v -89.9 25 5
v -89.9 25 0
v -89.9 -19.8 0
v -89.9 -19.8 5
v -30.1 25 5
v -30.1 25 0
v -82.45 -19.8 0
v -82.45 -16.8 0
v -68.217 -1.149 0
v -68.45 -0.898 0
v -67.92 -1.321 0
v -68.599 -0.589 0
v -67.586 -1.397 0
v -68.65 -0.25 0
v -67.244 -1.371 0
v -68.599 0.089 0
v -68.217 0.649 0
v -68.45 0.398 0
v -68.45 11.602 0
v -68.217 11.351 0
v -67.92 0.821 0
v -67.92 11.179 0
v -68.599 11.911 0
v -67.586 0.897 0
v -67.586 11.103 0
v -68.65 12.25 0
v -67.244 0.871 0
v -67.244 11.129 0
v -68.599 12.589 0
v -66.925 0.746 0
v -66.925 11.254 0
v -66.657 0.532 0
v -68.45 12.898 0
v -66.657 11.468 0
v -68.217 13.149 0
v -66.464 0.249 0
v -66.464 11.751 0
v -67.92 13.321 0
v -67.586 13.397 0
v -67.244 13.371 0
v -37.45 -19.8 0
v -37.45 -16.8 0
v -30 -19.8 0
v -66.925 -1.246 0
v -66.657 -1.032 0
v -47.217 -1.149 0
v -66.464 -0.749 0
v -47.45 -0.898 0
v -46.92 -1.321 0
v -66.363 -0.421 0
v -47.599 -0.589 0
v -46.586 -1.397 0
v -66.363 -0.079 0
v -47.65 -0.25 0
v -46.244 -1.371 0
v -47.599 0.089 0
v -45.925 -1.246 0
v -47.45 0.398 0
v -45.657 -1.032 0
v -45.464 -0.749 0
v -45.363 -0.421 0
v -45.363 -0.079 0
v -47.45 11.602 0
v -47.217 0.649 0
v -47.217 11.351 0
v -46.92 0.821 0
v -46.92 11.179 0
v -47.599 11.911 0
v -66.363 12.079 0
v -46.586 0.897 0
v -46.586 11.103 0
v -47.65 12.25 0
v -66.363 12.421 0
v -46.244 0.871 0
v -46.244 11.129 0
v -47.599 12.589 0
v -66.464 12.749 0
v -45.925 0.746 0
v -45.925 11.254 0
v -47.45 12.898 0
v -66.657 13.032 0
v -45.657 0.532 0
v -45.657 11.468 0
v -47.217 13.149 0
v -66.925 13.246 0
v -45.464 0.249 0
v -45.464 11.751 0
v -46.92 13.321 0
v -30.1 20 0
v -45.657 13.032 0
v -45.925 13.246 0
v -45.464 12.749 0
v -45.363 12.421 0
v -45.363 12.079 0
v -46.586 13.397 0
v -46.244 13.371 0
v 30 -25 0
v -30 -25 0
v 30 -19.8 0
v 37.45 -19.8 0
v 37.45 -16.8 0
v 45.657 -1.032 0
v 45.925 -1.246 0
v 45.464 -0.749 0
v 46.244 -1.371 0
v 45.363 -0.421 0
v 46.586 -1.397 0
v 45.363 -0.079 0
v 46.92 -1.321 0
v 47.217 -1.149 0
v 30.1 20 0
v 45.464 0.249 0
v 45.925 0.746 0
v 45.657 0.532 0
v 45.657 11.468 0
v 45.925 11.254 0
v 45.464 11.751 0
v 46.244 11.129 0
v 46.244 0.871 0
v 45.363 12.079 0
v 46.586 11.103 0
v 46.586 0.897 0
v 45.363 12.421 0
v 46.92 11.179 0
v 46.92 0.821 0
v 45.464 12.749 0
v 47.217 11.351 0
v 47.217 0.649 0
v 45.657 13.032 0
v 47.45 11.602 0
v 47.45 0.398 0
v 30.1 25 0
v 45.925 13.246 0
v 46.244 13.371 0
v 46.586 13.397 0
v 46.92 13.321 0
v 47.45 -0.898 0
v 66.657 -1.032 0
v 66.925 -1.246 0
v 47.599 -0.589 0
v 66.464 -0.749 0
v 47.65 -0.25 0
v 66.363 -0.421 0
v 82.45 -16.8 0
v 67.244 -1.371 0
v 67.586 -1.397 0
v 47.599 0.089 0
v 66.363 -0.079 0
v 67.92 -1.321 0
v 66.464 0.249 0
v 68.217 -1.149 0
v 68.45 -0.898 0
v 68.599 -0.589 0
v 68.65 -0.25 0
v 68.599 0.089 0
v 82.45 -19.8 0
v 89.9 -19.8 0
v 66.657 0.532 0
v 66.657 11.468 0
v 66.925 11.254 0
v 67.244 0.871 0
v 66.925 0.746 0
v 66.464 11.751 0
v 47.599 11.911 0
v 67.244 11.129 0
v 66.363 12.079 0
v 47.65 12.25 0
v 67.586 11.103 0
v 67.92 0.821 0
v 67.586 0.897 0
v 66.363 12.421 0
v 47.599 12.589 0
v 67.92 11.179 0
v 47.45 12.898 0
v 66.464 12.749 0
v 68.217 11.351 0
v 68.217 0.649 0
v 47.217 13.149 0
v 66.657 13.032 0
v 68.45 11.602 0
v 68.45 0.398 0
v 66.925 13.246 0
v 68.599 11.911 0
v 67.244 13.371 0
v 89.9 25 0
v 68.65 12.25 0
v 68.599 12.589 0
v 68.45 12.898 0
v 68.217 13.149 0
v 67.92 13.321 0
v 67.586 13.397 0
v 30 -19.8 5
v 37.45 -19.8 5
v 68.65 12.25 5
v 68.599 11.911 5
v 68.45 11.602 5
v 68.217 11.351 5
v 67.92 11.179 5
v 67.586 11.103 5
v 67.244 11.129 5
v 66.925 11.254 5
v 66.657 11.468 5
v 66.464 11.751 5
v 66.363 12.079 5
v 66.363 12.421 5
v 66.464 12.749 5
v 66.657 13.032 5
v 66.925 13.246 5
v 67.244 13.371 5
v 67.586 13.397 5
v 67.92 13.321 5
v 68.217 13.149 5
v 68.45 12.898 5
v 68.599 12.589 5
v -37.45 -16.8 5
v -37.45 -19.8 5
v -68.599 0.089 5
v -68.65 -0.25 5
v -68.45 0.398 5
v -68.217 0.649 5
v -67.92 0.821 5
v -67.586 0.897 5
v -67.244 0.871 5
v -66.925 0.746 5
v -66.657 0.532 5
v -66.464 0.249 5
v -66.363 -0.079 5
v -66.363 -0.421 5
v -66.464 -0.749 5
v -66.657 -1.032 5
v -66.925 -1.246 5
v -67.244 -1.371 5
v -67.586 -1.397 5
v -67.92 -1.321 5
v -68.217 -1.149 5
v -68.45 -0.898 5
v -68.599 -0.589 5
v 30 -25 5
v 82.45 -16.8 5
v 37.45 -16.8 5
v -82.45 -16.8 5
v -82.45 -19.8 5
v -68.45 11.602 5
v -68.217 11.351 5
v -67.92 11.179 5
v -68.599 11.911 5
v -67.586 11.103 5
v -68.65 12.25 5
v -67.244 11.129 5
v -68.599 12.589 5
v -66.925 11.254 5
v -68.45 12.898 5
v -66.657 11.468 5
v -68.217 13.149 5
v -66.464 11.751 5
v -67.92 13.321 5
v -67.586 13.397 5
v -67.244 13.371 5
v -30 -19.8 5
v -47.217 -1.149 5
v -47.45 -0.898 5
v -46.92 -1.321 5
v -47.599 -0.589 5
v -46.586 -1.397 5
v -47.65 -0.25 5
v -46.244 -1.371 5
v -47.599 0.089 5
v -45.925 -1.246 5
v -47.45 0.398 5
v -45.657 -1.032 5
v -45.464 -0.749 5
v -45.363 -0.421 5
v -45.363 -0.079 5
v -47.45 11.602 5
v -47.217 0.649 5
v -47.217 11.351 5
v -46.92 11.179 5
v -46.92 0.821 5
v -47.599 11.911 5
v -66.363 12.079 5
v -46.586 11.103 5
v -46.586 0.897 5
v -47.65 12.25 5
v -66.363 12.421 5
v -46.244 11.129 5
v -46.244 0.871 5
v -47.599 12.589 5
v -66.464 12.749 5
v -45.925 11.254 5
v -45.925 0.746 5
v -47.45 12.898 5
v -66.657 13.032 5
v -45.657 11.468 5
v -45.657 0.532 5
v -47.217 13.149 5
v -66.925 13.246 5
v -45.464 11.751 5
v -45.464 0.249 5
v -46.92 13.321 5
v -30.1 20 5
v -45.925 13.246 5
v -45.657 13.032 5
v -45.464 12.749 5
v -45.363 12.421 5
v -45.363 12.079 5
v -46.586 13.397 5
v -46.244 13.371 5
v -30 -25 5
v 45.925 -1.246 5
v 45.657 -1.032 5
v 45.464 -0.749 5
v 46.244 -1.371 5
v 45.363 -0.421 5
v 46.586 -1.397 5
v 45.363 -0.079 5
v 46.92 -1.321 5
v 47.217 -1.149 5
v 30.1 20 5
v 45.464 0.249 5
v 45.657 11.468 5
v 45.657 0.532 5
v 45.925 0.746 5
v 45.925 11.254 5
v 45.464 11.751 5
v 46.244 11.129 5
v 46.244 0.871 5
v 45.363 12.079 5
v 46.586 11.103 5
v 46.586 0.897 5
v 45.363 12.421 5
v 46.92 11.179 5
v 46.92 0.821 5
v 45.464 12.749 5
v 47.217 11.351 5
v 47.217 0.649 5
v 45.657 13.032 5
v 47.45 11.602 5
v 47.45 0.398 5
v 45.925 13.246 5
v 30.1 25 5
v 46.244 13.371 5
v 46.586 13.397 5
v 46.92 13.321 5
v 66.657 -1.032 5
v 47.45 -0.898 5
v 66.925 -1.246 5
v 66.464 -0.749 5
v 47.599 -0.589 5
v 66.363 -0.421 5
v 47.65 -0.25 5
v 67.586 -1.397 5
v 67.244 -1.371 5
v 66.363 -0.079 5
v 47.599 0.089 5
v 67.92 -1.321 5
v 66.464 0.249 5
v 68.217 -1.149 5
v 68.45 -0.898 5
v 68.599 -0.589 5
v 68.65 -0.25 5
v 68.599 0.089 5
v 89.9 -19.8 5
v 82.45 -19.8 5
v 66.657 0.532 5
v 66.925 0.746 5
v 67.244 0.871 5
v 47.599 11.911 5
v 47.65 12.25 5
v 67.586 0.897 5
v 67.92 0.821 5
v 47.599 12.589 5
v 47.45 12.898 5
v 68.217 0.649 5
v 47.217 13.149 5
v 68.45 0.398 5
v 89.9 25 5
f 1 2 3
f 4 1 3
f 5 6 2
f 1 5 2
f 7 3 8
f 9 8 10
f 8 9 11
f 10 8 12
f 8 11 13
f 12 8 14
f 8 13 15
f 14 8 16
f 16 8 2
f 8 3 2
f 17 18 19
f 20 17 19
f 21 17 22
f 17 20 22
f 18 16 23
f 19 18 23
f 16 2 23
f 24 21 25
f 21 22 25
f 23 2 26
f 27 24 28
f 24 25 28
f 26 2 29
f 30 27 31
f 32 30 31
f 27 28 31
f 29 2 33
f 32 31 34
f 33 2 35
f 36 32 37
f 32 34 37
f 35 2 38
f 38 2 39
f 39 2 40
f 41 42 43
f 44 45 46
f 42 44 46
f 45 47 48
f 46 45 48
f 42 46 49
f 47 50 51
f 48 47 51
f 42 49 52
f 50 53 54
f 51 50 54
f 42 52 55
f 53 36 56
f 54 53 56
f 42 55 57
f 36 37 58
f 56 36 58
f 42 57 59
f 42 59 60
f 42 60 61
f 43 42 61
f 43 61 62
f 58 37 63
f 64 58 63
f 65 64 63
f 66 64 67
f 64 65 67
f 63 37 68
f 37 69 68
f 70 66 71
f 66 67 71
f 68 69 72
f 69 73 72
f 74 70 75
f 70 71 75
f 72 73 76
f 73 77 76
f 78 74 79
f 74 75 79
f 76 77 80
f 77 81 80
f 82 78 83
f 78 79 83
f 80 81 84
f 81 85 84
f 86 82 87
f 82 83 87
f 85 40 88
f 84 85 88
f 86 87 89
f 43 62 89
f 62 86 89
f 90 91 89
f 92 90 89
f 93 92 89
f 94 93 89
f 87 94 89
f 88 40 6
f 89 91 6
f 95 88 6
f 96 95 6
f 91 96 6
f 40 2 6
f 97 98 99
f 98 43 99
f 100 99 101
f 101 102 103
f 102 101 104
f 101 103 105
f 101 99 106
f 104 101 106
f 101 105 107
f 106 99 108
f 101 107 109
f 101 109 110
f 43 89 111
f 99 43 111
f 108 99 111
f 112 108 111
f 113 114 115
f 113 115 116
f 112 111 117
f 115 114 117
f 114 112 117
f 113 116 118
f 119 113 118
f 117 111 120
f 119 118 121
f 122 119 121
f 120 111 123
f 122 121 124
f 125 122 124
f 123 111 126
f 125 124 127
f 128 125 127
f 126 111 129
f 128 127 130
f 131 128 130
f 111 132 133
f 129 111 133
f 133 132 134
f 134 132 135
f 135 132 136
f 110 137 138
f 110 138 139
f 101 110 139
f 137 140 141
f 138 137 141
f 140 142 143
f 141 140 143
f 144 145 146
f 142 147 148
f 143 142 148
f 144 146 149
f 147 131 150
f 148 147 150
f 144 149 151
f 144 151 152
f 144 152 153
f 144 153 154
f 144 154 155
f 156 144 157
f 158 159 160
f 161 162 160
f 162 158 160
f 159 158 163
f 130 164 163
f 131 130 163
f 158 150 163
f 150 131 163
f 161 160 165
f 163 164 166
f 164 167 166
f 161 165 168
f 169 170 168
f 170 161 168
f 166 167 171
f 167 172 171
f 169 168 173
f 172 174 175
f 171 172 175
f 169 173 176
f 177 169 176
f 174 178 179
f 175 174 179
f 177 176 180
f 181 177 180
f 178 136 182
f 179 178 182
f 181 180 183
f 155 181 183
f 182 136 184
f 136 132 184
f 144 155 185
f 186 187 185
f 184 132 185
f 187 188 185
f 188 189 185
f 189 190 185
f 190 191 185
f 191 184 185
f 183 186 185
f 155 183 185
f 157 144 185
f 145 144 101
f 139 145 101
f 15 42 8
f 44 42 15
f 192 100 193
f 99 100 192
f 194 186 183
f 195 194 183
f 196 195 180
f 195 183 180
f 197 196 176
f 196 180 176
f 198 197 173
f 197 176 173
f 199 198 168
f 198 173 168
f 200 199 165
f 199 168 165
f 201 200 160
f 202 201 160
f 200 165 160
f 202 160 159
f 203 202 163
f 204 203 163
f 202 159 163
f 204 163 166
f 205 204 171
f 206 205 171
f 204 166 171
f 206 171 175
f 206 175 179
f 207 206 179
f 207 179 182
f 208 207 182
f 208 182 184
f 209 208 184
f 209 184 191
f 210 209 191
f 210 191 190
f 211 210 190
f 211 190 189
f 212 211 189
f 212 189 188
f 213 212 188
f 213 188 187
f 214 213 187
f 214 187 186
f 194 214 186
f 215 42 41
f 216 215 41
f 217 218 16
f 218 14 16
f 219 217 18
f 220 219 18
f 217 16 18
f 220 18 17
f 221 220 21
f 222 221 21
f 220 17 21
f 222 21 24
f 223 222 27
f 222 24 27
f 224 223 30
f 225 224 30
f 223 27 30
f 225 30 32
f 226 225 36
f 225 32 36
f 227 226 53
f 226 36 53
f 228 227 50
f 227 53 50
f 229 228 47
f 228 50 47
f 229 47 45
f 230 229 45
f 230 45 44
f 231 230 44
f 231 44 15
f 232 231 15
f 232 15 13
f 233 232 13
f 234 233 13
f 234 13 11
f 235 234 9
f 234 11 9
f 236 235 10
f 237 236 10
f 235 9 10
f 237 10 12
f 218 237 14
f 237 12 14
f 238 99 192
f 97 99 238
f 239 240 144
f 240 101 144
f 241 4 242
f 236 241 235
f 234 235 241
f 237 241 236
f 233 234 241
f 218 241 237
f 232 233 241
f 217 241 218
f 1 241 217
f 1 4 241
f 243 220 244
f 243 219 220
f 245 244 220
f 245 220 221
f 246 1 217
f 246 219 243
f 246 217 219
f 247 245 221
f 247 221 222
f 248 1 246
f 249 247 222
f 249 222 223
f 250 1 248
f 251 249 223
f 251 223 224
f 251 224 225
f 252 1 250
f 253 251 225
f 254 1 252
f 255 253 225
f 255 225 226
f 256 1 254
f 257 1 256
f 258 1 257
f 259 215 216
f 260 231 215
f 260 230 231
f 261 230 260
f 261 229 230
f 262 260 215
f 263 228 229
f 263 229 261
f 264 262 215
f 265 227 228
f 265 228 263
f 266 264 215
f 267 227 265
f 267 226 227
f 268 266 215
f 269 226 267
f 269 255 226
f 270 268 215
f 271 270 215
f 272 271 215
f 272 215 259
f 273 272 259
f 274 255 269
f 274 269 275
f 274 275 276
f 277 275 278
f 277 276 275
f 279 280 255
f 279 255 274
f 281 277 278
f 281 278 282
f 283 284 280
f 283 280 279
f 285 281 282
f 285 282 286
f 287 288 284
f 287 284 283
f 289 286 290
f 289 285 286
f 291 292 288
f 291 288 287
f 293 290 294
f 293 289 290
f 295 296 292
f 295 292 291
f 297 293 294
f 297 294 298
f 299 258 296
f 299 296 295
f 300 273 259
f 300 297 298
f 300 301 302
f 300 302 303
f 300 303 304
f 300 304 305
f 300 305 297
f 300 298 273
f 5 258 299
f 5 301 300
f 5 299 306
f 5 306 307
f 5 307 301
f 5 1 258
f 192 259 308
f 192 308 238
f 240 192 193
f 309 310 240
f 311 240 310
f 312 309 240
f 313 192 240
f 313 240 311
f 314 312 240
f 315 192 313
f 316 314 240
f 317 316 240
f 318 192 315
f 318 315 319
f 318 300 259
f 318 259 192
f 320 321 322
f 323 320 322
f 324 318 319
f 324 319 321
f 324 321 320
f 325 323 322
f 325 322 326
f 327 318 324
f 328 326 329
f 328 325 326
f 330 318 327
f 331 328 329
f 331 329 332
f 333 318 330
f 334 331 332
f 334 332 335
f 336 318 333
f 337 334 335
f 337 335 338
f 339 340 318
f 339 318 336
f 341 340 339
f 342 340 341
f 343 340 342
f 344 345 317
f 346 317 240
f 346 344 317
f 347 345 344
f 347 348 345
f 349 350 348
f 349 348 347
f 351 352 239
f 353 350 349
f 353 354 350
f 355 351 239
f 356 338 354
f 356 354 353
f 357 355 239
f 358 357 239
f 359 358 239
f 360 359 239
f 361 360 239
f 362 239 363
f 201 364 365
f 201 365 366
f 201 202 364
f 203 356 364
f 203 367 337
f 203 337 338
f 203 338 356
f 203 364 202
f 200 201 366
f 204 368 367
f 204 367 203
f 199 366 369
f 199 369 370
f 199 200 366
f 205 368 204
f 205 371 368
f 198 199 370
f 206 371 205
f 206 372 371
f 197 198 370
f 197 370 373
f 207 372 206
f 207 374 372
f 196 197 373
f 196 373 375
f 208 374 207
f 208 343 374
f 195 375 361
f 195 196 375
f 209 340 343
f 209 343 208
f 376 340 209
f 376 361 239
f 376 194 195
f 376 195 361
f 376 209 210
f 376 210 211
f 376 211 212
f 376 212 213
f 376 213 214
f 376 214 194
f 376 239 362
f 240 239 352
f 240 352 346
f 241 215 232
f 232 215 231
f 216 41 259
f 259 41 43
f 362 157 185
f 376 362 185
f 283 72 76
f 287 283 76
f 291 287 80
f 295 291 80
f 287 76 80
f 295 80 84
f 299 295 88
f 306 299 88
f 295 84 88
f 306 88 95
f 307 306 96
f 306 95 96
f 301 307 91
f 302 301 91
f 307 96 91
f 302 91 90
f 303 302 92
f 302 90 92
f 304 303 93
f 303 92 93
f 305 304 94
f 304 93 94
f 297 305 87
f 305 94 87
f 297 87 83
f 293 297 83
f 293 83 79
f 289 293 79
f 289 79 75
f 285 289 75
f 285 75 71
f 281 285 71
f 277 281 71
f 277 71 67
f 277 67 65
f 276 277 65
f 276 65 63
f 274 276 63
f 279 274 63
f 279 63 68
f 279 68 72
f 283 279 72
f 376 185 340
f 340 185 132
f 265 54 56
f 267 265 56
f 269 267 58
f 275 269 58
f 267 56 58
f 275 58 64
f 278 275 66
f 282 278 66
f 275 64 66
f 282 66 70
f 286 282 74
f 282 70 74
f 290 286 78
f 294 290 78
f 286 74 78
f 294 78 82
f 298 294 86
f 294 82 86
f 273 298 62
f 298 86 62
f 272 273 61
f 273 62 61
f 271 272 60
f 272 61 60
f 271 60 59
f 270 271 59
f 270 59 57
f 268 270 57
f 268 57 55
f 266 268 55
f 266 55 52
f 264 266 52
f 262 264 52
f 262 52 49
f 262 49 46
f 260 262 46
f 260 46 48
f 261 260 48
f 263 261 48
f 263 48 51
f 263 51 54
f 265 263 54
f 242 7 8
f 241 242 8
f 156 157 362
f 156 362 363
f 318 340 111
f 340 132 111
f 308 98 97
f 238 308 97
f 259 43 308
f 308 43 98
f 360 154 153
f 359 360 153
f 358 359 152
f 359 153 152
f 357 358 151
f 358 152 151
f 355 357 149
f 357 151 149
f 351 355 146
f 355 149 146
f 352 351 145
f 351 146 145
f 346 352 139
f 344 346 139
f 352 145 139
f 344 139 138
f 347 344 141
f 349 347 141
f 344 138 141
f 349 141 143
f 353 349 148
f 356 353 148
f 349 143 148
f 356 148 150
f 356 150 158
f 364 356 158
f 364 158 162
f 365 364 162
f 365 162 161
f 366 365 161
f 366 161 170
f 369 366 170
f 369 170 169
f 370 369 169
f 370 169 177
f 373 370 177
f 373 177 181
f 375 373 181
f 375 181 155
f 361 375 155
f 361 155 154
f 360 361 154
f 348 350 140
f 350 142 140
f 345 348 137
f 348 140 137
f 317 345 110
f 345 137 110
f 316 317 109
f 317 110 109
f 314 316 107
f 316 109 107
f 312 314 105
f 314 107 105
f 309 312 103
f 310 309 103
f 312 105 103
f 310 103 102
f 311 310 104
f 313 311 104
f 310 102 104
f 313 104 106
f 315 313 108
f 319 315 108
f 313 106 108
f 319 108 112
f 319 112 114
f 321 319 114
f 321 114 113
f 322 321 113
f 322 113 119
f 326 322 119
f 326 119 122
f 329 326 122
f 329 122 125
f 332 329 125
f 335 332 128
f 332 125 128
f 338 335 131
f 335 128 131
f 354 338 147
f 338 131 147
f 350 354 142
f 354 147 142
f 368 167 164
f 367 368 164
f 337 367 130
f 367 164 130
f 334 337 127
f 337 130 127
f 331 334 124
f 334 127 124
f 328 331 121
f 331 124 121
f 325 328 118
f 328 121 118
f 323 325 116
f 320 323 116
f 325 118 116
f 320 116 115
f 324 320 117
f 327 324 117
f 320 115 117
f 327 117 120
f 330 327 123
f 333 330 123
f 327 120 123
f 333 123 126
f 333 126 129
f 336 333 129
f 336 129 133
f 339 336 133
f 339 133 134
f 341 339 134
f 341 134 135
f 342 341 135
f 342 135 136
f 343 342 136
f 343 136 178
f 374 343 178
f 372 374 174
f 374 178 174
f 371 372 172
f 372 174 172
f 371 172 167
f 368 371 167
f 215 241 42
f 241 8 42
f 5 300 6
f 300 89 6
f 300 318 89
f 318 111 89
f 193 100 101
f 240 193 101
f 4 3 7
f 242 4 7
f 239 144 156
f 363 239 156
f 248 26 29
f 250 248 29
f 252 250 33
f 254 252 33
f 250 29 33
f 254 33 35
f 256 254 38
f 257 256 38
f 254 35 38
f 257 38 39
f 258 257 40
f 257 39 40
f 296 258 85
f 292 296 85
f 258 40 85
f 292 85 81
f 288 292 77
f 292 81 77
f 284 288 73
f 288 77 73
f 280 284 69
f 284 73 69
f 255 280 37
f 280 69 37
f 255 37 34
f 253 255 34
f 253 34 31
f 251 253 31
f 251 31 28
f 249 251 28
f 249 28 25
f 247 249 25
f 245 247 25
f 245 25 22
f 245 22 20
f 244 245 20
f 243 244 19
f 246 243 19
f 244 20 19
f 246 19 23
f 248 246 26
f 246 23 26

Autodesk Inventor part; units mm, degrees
ref_plane "YZ Plane" through (0, 0, 0) normal (1, 0, 0) x (0, 1, 0)
ref_plane "XZ Plane" through (0, 0, 0) normal (0, 1, 0) x (-1, 0, 0)
ref_plane "XY Plane" through (0, 0, 0) normal (0, 0, 1) x (1, 0, 0)
sketch "Sketch1" plane through (0, 0, 0) normal (0, 0, 1) x (1, 0, 0)
  line L0 (-89.9, -25) -> (89.9, -25)
  line L1 (89.9, -25) -> (89.9, 25)
  line L2 (89.9, 25) -> (-89.9, 25)
  line L3 (-89.9, 25) -> (-89.9, -25)
  line L4 (-89.9, -25) -> (89.9, 25) construction
  line L5 (89.9, -25) -> (-89.9, 25) construction
  line L6 (46.5, 12.25) -> (67.5, 12.25) construction
  line L7 (67.5, 12.25) -> (67.5, -0.25) construction
  line L8 (67.5, -0.25) -> (46.5, -0.25) construction
  line L9 (46.5, -0.25) -> (46.5, 12.25) construction
  line L10 (46.5, 12.25) -> (67.5, -0.25) construction
  line L11 (67.5, 12.25) -> (46.5, -0.25) construction
  circle A0 centre (46.5, 12.25) radius 1.15
  circle A1 centre (67.5, 12.25) radius 1.15
  circle A2 centre (67.5, -0.25) radius 1.15
  circle A3 centre (46.5, -0.25) radius 1.15
  line L12 (-30.1, 25) -> (30.1, 25)
  line L13 (30.1, 25) -> (30.1, 20)
  line L14 (30.1, 20) -> (-30.1, 20)
  line L15 (-30.1, 20) -> (-30.1, 25)
  line L16 (-30.1, 25) -> (30.1, 20) construction
  line L17 (30.1, 25) -> (-30.1, 20) construction
  line L18 (-89.9, -19.8) -> (-30, -19.8)
  line L19 (-30, -19.8) -> (-30, -25)
  line L20 (-30, -25) -> (-89.9, -25)
  line L21 (-89.9, -25) -> (-89.9, -19.8)
  line L22 (-89.9, -19.8) -> (-30, -25) construction
  line L23 (-30, -19.8) -> (-89.9, -25) construction
  line L24 (19.7182, -25) -> (70.1, -25)
  line L25 (0, 0) -> (0, -25) construction
  line L26 (30, -25) -> (89.9, -25)
  line L27 (89.9, -25) -> (89.9, -19.8)
  line L28 (89.9, -19.8) -> (30, -19.8)
  line L29 (30, -19.8) -> (30, -25)
  line L30 (30, -25) -> (89.9, -19.8) construction
  line L31 (89.9, -25) -> (30, -19.8) construction
  line L32 (37.45, -16.8) -> (82.45, -16.8)
  line L33 (82.45, -16.8) -> (82.45, -19.8)
  line L34 (82.45, -19.8) -> (37.45, -19.8)
  line L35 (37.45, -19.8) -> (37.45, -16.8)
  line L36 (37.45, -16.8) -> (82.45, -19.8) construction
  line L37 (82.45, -16.8) -> (37.45, -19.8) construction
  point P0 (57, 6)
  point P1 (0, 22.5)
  point P2 (-59.95, -22.4)
  point P3 (30.1, 25)
  point P4 (-30.1, 25)
  point P5 (59.95, -22.4)
  point P6 (30, -25)
  point P7 (59.95, -18.3)
  point P8 (37.45, -19.8)
  dimension "d0" = 179.8
  dimension "d1" = 50
  dimension "d2" = 12.5
  dimension "d3" = 21
  dimension "d4" = 2.3
  dimension "d5" = 2.3
  dimension "d6" = 2.3
  dimension "d7" = 2.3
  dimension "d8" = 57
  dimension "d9" = 6
  dimension "d10" = 5
  dimension "d11" = 60.2
  dimension "d12" = 5.2
  dimension "d21" = 5.2
  dimension "d24" = 60
  dimension "d25" = 45
  dimension "d26" = 3
extrude "Extrusion1" add sketch "Sketch1" along normal blind 5 contours L19 L18 L3 L2 L15 L14 L13 L1 L28 L33 L32 L35 L29 L0 | L35 L32 L33 L28 | A0 | A1 | A2 | A3
extrude "Extrusion2" cut sketch "Sketch1" along normal through all contours L35 L32 L33 L28 | A0 | A1 | A2 | A3
mirror "Mirror1" about plane through (0, 0, 0) normal (1, 0, 0) of "Extrusion2"
equation "\"d5\" = d4"
equation "\"d6\" = d5"
equation "\"d7\" = d4"
properties part number "upper-front-plate-support" material "Glass"
